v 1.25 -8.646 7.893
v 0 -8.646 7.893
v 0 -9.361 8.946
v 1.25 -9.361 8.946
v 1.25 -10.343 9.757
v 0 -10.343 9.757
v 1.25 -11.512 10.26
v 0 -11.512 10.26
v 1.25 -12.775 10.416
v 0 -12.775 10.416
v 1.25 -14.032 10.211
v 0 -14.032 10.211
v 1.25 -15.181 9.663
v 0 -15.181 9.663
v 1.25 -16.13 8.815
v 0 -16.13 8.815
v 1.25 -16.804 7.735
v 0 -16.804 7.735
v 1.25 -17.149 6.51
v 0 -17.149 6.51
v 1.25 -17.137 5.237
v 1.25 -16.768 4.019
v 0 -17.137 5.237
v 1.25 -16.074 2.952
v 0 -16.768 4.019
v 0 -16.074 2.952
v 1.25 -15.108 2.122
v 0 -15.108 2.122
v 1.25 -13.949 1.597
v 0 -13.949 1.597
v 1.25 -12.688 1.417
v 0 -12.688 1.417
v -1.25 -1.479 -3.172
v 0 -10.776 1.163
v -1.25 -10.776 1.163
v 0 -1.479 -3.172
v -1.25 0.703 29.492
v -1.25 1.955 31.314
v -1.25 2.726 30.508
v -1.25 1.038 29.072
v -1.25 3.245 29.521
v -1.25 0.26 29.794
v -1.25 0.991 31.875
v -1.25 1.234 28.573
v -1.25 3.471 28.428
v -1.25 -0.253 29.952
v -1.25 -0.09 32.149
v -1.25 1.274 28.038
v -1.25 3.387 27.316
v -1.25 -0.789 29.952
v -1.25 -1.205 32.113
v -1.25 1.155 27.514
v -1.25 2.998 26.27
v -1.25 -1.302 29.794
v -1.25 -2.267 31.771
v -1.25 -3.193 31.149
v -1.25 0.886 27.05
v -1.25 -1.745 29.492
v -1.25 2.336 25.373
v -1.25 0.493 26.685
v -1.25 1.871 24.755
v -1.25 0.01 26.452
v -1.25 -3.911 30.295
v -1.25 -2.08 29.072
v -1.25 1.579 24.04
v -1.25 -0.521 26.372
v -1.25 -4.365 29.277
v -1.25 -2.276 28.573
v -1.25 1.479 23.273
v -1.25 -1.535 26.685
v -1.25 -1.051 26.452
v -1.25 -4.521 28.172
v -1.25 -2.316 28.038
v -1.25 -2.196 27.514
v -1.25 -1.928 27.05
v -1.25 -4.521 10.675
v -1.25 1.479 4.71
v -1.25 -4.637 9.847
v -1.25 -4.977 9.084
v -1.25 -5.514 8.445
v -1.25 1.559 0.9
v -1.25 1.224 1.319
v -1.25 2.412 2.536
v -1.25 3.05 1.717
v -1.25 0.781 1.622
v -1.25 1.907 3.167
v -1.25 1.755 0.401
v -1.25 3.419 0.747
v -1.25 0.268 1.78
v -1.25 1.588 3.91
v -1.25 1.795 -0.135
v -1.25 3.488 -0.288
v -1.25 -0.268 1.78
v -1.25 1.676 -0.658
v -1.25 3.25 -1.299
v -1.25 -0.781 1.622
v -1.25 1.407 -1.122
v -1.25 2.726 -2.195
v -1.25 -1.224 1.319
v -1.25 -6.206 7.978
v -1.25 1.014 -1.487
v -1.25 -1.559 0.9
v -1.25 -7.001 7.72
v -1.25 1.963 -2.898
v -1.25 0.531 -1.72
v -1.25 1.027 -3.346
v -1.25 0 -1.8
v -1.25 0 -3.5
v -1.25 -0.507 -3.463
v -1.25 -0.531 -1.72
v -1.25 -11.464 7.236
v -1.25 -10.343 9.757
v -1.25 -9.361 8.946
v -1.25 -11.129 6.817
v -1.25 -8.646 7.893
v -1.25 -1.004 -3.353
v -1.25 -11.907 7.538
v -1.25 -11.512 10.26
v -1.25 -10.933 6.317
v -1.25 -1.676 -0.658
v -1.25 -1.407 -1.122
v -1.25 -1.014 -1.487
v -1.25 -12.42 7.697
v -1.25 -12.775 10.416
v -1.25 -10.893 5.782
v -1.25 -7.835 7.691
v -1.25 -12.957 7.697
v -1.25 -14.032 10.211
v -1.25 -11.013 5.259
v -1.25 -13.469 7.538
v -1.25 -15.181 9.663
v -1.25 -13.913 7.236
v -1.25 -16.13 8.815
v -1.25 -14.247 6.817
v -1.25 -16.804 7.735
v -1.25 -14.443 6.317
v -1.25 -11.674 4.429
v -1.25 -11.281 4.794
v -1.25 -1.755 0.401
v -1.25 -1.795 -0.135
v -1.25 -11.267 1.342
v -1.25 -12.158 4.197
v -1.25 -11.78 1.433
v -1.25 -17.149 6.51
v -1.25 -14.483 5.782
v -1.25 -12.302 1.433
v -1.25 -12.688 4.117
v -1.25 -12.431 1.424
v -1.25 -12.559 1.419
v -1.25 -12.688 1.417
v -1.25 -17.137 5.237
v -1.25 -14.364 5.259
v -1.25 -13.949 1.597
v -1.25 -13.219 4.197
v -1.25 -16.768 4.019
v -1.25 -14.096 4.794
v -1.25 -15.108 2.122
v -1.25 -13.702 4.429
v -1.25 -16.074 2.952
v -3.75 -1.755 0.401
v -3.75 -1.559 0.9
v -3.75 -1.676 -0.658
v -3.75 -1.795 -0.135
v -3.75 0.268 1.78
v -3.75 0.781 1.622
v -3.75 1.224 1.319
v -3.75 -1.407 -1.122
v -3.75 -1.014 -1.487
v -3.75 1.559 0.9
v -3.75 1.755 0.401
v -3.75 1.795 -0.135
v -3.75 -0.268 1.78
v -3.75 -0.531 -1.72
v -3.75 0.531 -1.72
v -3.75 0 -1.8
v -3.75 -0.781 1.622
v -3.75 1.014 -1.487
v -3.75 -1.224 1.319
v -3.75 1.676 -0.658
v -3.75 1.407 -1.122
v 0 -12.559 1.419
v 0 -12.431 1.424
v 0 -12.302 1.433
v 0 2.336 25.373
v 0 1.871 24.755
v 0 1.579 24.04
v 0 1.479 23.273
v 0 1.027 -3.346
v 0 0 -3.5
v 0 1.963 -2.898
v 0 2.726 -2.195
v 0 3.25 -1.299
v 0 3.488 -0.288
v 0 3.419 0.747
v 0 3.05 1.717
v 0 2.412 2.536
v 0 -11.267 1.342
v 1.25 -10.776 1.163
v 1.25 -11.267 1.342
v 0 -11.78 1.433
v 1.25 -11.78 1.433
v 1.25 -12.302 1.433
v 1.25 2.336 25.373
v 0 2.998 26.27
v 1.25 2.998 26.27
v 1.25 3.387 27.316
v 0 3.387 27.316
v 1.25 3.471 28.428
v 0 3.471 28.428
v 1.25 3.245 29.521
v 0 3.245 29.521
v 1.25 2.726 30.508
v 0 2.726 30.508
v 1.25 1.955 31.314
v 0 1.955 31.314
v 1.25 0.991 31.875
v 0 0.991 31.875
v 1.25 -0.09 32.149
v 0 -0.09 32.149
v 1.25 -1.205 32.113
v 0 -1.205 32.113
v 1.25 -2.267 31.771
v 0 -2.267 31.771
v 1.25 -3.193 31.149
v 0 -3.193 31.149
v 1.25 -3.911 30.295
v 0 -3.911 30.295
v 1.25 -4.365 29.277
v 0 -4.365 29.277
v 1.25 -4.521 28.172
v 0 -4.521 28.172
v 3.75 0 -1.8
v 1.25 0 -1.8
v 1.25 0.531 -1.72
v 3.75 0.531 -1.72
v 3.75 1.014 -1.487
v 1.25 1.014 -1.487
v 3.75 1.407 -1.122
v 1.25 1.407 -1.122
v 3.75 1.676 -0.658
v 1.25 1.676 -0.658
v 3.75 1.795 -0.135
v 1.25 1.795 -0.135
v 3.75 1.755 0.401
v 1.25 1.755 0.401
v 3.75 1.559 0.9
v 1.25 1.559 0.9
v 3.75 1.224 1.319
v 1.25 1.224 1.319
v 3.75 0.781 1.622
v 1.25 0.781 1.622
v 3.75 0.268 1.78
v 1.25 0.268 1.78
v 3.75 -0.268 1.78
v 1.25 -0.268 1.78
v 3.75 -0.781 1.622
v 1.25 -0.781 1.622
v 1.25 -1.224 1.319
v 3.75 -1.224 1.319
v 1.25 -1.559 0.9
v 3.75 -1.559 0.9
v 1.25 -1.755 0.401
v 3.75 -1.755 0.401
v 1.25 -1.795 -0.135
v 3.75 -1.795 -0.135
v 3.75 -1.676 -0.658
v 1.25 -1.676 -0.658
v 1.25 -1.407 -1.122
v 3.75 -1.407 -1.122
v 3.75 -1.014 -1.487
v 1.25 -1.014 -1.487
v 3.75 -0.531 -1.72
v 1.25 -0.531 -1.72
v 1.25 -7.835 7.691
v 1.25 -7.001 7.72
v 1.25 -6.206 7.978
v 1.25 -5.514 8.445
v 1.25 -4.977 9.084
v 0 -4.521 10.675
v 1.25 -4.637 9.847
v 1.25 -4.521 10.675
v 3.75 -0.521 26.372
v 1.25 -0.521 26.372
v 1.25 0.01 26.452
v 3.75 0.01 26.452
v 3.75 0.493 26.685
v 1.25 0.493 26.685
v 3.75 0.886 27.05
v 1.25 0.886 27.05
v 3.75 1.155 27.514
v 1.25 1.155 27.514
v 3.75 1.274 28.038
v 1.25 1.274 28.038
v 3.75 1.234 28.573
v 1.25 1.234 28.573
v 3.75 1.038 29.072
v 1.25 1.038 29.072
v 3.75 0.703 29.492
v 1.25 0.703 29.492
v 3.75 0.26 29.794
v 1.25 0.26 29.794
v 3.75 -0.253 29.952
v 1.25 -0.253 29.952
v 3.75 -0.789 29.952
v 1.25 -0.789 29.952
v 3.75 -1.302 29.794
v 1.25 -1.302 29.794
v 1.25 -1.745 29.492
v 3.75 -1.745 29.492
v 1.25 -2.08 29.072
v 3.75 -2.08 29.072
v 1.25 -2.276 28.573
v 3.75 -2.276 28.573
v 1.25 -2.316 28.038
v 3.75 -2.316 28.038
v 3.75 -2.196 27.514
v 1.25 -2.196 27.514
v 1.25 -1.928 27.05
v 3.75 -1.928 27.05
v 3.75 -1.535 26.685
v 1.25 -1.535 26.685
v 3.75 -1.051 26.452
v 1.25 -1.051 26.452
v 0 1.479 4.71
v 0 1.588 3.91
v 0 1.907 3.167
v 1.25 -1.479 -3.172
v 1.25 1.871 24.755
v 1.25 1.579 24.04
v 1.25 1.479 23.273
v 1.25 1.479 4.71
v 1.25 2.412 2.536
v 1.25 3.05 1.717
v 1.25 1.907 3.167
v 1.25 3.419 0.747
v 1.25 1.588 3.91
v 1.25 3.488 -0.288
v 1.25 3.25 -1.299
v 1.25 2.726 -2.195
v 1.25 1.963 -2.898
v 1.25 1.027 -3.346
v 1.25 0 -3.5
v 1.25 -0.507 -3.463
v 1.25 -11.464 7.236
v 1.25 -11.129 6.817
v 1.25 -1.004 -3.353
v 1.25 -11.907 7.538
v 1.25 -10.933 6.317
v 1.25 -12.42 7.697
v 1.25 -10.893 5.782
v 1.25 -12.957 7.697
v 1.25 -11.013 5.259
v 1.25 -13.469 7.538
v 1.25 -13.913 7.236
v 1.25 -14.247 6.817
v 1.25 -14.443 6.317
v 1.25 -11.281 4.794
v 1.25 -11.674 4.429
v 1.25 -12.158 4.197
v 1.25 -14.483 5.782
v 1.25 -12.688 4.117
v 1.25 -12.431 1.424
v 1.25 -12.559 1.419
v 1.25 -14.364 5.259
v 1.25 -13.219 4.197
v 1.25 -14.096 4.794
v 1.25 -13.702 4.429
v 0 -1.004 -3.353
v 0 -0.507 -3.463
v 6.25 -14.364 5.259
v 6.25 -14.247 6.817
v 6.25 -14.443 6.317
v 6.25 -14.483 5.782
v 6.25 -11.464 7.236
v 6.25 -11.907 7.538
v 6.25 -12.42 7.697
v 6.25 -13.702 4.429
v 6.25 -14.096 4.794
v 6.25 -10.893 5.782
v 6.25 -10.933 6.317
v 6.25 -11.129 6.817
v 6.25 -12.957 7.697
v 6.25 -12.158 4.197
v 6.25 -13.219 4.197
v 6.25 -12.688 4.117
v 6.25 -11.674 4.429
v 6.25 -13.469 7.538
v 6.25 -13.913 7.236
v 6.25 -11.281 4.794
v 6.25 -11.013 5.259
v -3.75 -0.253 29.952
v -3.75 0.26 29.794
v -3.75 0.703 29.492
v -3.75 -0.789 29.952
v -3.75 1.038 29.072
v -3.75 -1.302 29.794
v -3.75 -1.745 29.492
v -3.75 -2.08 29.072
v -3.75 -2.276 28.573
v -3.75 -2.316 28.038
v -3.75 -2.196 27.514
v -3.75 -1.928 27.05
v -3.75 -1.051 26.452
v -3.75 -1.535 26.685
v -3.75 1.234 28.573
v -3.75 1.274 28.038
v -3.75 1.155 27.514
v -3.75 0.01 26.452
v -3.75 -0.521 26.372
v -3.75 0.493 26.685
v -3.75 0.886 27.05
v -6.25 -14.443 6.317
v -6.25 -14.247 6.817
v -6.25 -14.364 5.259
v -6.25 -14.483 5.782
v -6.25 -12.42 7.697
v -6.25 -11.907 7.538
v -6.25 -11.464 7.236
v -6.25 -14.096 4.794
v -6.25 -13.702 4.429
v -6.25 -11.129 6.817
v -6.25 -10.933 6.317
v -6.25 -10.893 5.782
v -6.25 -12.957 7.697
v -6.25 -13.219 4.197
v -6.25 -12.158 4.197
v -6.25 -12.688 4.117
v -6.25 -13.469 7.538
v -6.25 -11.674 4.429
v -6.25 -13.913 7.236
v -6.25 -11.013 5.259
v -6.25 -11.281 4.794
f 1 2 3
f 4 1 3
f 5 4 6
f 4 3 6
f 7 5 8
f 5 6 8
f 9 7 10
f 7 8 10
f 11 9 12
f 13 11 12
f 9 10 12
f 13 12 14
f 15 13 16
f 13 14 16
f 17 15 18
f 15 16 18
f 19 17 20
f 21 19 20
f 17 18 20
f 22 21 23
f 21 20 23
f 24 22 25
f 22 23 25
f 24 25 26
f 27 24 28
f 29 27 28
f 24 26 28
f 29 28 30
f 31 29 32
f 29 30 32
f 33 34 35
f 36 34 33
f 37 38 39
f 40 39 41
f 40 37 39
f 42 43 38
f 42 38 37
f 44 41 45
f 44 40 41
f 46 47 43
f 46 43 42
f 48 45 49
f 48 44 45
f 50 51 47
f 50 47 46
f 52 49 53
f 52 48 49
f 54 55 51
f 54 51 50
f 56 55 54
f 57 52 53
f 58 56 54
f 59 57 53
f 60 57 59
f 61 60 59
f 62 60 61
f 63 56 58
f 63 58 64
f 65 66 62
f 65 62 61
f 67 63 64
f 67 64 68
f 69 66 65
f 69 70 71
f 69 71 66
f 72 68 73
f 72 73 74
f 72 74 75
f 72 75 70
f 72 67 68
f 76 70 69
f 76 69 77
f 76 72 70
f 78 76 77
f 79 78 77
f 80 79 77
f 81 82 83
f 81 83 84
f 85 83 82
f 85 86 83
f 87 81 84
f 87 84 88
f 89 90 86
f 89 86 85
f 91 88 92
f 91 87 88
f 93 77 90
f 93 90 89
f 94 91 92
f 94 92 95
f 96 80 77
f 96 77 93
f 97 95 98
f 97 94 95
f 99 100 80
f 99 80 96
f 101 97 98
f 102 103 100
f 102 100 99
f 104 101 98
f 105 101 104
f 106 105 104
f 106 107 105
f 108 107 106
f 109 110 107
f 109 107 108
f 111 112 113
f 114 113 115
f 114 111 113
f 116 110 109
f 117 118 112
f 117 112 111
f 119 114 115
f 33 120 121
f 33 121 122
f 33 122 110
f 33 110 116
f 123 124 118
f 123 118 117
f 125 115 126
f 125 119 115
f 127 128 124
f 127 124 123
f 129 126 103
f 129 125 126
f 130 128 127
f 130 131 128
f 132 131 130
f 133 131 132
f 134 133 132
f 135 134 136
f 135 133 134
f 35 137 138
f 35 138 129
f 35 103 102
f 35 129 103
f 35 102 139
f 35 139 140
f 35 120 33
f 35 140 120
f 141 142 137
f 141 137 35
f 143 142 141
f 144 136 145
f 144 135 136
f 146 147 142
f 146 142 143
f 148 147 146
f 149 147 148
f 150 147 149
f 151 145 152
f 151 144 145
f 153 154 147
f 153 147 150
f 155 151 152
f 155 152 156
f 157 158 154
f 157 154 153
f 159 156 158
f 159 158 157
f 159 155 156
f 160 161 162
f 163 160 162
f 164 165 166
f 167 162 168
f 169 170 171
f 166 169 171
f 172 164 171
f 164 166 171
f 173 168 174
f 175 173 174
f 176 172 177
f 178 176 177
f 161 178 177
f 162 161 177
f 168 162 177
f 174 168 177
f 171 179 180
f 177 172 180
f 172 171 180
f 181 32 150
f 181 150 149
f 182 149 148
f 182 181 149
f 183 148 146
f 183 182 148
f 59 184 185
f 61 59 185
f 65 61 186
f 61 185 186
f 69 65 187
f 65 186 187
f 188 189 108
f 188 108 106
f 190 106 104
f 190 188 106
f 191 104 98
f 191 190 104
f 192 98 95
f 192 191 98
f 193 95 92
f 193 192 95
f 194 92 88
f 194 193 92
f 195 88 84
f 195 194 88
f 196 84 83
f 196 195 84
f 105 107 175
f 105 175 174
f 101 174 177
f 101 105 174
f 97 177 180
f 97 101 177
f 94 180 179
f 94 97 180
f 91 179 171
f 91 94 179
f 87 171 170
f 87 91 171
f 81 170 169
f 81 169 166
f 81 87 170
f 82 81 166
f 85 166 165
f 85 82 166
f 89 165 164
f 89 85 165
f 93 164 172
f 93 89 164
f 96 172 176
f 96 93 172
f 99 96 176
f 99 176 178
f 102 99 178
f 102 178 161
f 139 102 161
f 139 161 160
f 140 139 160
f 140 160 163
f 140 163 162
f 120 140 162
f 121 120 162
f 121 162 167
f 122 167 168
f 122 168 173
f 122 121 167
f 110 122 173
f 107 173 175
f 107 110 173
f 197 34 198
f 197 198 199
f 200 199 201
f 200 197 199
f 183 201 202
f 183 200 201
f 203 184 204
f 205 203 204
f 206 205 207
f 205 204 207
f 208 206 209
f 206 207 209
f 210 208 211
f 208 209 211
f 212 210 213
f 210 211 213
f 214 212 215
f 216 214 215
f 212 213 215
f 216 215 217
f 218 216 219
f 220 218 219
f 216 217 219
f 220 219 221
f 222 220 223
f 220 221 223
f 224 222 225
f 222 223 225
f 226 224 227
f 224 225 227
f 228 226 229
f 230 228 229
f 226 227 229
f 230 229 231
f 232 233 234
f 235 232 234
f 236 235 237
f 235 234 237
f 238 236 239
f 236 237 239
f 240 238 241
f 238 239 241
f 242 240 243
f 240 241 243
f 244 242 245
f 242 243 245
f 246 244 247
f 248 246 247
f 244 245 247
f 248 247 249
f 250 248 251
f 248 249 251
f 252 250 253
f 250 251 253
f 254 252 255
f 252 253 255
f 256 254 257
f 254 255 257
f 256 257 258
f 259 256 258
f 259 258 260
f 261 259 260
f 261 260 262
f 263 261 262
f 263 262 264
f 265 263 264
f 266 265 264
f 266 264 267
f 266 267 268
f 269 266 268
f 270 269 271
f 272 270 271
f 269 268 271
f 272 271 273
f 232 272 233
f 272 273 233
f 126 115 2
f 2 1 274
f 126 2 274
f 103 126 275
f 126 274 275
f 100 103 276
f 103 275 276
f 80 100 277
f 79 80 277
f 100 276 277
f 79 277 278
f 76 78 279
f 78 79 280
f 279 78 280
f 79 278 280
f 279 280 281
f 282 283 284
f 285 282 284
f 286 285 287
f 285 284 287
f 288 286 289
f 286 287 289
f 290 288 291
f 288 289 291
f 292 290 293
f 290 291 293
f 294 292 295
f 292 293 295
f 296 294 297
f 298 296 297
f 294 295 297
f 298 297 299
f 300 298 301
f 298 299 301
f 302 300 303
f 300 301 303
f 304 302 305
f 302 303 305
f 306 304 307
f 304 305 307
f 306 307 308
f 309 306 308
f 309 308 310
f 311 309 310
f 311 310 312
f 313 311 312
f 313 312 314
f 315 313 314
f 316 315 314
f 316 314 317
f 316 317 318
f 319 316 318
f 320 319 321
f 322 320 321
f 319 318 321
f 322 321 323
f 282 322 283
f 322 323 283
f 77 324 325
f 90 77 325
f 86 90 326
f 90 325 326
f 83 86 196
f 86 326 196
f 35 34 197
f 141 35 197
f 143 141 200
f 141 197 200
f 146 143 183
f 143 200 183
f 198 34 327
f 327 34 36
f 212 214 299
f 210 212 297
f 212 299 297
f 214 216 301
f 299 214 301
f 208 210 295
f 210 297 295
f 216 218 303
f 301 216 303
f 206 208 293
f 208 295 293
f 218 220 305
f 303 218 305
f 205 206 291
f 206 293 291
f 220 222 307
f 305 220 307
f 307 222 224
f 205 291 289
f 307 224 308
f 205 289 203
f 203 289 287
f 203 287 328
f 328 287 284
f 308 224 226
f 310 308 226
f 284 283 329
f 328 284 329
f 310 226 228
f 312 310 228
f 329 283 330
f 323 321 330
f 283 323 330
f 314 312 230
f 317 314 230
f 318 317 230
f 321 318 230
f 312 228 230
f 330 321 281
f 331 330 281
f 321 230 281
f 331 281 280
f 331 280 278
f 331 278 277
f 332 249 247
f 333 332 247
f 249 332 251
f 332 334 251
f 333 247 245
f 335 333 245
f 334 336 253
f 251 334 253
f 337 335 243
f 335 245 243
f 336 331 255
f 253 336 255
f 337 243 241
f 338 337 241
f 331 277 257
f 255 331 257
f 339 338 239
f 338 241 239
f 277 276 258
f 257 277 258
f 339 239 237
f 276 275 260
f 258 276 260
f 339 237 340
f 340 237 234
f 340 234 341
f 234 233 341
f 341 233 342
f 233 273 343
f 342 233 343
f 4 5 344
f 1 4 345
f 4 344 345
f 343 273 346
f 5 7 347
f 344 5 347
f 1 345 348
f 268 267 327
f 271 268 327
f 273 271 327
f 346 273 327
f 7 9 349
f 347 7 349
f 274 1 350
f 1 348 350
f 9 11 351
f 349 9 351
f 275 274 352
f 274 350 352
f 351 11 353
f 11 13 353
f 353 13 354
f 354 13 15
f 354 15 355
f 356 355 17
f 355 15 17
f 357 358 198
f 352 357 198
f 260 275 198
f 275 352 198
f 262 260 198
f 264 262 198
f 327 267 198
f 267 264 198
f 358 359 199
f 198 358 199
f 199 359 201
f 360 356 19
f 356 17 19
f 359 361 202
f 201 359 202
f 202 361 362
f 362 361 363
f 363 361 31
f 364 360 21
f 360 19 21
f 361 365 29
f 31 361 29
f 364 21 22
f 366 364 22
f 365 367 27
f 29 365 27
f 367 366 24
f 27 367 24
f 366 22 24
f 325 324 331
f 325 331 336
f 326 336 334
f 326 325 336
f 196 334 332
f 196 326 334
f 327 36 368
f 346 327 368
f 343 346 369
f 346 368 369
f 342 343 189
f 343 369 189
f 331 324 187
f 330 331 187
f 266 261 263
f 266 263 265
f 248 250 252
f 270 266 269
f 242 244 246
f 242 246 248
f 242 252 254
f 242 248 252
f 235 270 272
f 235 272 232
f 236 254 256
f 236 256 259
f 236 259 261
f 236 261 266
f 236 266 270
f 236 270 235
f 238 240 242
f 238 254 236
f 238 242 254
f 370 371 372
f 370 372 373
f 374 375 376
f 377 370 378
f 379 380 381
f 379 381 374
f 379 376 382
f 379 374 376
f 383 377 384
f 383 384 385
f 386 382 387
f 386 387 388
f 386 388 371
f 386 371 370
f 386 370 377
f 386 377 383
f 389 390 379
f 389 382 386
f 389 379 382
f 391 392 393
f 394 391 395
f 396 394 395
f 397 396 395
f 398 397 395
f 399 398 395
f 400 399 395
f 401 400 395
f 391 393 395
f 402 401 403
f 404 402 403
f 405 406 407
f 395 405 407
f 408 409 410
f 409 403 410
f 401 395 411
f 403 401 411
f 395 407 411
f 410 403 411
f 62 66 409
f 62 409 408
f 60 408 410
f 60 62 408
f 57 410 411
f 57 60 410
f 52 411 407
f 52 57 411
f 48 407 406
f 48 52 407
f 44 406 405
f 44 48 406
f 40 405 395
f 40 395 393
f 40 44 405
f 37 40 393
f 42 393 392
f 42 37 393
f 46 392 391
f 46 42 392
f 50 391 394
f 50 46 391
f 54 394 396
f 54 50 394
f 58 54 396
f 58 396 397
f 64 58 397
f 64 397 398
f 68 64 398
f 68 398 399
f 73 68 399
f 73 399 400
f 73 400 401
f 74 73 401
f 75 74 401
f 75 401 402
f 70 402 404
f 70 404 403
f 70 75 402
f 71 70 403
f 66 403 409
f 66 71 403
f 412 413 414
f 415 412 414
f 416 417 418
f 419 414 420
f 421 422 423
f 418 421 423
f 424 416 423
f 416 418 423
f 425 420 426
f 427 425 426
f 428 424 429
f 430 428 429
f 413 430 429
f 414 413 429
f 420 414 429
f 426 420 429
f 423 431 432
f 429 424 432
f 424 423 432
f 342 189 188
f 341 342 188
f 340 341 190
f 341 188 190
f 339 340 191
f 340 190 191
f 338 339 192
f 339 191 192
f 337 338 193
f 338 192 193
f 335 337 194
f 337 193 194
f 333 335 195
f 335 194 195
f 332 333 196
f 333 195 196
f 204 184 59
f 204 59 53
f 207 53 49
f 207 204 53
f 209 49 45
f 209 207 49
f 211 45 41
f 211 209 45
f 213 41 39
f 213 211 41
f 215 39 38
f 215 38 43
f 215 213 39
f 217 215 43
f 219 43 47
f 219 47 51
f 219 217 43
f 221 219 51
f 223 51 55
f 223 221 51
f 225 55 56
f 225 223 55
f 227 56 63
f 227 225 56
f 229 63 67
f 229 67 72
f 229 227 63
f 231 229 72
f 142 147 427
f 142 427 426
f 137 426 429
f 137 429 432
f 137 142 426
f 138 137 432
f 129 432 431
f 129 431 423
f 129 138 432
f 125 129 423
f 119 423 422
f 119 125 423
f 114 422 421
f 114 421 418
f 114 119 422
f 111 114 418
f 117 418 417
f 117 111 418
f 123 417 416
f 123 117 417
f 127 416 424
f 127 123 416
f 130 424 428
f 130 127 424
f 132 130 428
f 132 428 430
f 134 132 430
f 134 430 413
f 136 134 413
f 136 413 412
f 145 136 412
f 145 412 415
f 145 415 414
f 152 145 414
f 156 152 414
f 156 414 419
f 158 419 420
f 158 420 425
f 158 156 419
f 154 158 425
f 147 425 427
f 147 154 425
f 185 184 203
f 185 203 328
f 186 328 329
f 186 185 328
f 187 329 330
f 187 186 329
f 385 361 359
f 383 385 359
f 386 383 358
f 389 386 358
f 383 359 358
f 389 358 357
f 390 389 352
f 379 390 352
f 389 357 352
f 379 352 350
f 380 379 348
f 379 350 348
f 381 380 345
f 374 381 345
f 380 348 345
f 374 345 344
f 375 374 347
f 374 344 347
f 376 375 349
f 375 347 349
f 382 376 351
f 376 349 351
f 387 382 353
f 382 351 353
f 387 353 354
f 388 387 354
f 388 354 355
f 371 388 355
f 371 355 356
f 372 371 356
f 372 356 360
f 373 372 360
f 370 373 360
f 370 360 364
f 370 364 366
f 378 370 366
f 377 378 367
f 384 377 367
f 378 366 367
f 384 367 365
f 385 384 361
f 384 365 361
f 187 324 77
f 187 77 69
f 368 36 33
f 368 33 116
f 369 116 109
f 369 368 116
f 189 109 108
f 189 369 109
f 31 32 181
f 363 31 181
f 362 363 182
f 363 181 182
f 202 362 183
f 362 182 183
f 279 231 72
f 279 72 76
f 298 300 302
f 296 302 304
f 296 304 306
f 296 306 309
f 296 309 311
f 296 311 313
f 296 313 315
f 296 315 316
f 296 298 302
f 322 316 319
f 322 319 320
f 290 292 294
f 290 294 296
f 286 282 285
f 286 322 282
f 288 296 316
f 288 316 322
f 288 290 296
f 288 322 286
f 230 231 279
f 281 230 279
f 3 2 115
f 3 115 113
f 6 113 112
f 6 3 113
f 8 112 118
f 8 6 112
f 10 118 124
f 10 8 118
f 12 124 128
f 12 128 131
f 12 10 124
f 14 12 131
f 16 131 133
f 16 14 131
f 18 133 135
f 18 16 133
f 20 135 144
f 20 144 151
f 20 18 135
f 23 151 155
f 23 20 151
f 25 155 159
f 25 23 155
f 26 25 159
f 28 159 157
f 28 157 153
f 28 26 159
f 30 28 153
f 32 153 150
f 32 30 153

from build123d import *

# Parameters (mm, degrees)
EXTRUDE_1_DEPTH     = 1.25
SKETCH_1_3_R        = 2
CUT_EXTRUDE_1_DEPTH = 37.497164572
FILLET_1_R          = 3
EXTRUDE_START       = -1.25
SKETCH_2_R          = 2
EXTRUDE_2_DEPTH     = 1.25
SKETCH_2_5_R        = 1.8
EXTRUDE_5_DEPTH     = 2.5
SKETCH_2_7_R        = 1.8
EXTRUDE_7_DEPTH     = 5


with BuildPart() as part:
    # 草图1 → 凸台-拉伸1 (new body)
    with BuildSketch(Plane(origin=(0, 0, 0), x_dir=(0, 0, -1), z_dir=(1, 0, 0))):
        with BuildLine():
            Line((-28.172077255, -4.520836084), (-28.172077255, 1.479163916))
            Line((-28.172077255, 1.479163916), (-24.707975639, 1.479163916))
            ThreePointArc((-24.707975639, 1.479163916), (-31.63617887, 1.479163916), (-28.172077255, -4.520836084))
        make_face()
        with BuildLine():
            Line((-24.707975639, 1.479163916), (-28.172077255, 1.479163916))
            Line((-28.172077255, 1.479163916), (-28.172077255, -4.520836084))
            ThreePointArc((-28.172077255, -4.520836084), (-25.34365013, -3.349263209), (-24.172077255, -0.520836084))
            ThreePointArc((-24.172077255, -0.520836084), (-24.308373949, 0.514440097), (-24.707975639, 1.479163916))
        make_face()
        with BuildLine():
            Line((-3.172077255, 1.479163916), (-24.707975639, 1.479163916))
            ThreePointArc((-24.707975639, 1.479163916), (-24.308373949, 0.514440097), (-24.172077255, -0.520836084))
            ThreePointArc((-24.172077255, -0.520836084), (-25.34365013, -3.349263209), (-28.172077255, -4.520836084))
            Line((-28.172077255, -4.520836084), (-5.969923204, -4.520836084))
            Line((-5.969923204, -4.520836084), (-3.172077255, 1.479163916))
        make_face()
        with BuildLine():
            Line((3.172077255, -1.479163916), (-3.172077255, 1.479163916))
            Line((-3.172077255, 1.479163916), (-3.172077255, -1.479163916))
            ThreePointArc((-3.172077255, -1.479163916), (0, -3.5), (3.172077255, -1.479163916))
        make_face()
        with BuildLine():
            ThreePointArc((3.5, 0), (0.757538649, 3.417036025), (-3.172077255, 1.479163916))
            Line((-3.172077255, 1.479163916), (3.172077255, -1.479163916))
            ThreePointArc((3.172077255, -1.479163916), (3.417036025, -0.757538649), (3.5, 0))
        make_face()
        with BuildLine():
            ThreePointArc((-3.172077255, -1.479163916), (-3.5, 0), (-3.172077255, 1.479163916))
            Line((-3.172077255, 1.479163916), (-5.969923204, -4.520836084))
            Line((-5.969923204, -4.520836084), (-3.172077255, -4.520836084))
            Line((-3.172077255, -4.520836084), (-3.172077255, -1.479163916))
        make_face()
        with BuildLine():
            Line((-3.172077255, -1.479163916), (-3.172077255, 1.479163916))
            ThreePointArc((-3.172077255, 1.479163916), (-3.5, 0), (-3.172077255, -1.479163916))
        make_face()
        with BuildLine():
            Line((-3.172077255, -4.520836084), (-5.969923204, -4.520836084))
            Line((-5.969923204, -4.520836084), (-7.893387964, -8.645719574))
            ThreePointArc((-7.893387964, -8.645719574), (-4.014873487, -8.609923977), (-1.549233455, -11.604047406))
            Line((-1.549233455, -11.604047406), (3.172077255, -1.479163916))
            ThreePointArc((3.172077255, -1.479163916), (0, -3.5), (-3.172077255, -1.479163916))
            Line((-3.172077255, -1.479163916), (-3.172077255, -4.520836084))
        make_face()
        with BuildLine():
            ThreePointArc((-1.549233455, -11.604047406), (-4.014873487, -8.609923977), (-7.893387964, -8.645719574))
            Line((-7.893387964, -8.645719574), (-9.088732919, -11.209145102))
            Line((-9.088732919, -11.209145102), (-2.74457841, -14.167472935))
            Line((-2.74457841, -14.167472935), (-1.549233455, -11.604047406))
        make_face()
        with BuildLine():
            Line((-9.088732919, -11.209145102), (-7.893387964, -8.645719574))
            ThreePointArc((-7.893387964, -8.645719574), (-8.299375187, -16.50572276), (-1.416655664, -12.688309019))
            ThreePointArc((-1.416655664, -12.688309019), (-1.449923081, -12.14214052), (-1.549233455, -11.604047406))
            Line((-1.549233455, -11.604047406), (-2.74457841, -14.167472935))
            Line((-2.74457841, -14.167472935), (-9.088732919, -11.209145102))
        make_face()
    extrude(amount=EXTRUDE_1_DEPTH)

    # 草图1<3> → 切除-拉伸1 (cut, through all)
    with BuildSketch(Plane(origin=(0, 0, 0), x_dir=(0, 0, -1), z_dir=(1, 0, 0))):
        with Locations((-28.172077255, -0.520836084)):
            Circle(SKETCH_1_3_R)
        Circle(SKETCH_1_3_R)
        with Locations((-5.916655664, -12.688309019)):
            Circle(SKETCH_1_3_R)
    extrude(amount=CUT_EXTRUDE_1_DEPTH, mode=Mode.SUBTRACT)

    # 圆角1
    # the kernel refuses this fillet: 3 mm, written as the material it adds along each edge
    with BuildSketch(Plane(origin=(0, -11.604047406, 1.549233455), x_dir=(0, 0.9063077870366663, -0.4226182617406644), z_dir=(1, 0, 0))) as fillet_1_piece_1:
        with BuildLine():
            CenterArc((0.913230262, -3), FILLET_1_R, 90, 29.926434867)
            Line((-0.583432693, -0.4), (-0.613365952, -0.348))
            ThreePointArc((-0.613365952, -0.348), (-0.317772106, -0.161995545), (-0.037712362, 0.046666667))
            Line((-0.037712362, 0.046666667), (0, 0.06))
            Line((0, 0.06), (0.913230262, 0.06))
            Line((0.913230262, 0.06), (0.913230262, 0))
        make_face()
    extrude(amount=1.25)
    with BuildSketch(Plane(origin=(0, 1.479163916, 3.172077255), x_dir=(0, 0, 1), z_dir=(1, 0, 0))) as fillet_1_piece_2:
        with BuildLine():
            CenterArc((1.538240209, -3), FILLET_1_R, 90, 46.440922497)
            Line((-0.635752466, -0.932693577), (-0.67923232, -0.891347449))
            ThreePointArc((-0.67923232, -0.891347449), (-0.329607023, -0.458350724), (-0.054378467, 0.025357096))
            Line((-0.054378467, 0.025357096), (0, 0.06))
            Line((0, 0.06), (1.538240209, 0.06))
            Line((1.538240209, 0.06), (1.538240209, 0))
        make_face()
    extrude(amount=1.25)
    with BuildSketch(Plane(origin=(0, 1.479163916, 24.707975639), x_dir=(0, 0.7902368852402469, 0.6128014892326821), z_dir=(1, 0, 0))) as fillet_1_piece_3:
        with BuildLine():
            CenterArc((1.49141536, -2.972297887), FILLET_1_R, 97.792345701, 44.415308597)
            Line((-0.879295296, -1.133893419), (-0.926709509, -1.09712533))
            Line((-0.926709509, -1.09712533), (-0.047414213, 0.036768089))
            Line((-0.047414213, 0.036768089), (0.008134993, 0.059445958))
            ThreePointArc((0.008134993, 0.059445958), (0.542332858, 0.023063849), (1.076530723, 0.059445958))
            Line((1.076530723, 0.059445958), (1.084665716, 0))
        make_face()
    extrude(amount=1.25)
    with BuildSketch(Plane(origin=(0, -4.520836084, 5.969923204), x_dir=(0, 0, 1), z_dir=(1, 0, 0))) as fillet_1_piece_4:
        with BuildLine():
            CenterArc((4.704586321, 3), FILLET_1_R, 157.978087479, 112.021912521)
            Line((1.923464761, 4.12488349), (1.867842329, 4.14738116))
            ThreePointArc((1.867842329, 4.14738116), (0.907353913, 2.087798841), (-0.054378467, 0.025357096))
            Line((-0.054378467, 0.025357096), (0, -0.06))
            Line((0, -0.06), (4.704586321, -0.06))
            Line((4.704586321, -0.06), (4.704586321, 0))
        make_face()
    extrude(amount=1.25)

    # 草图2 → 凸台-拉伸2 (add)
    with BuildSketch(Plane(origin=(1.25, 0, 0), x_dir=(0, 0, -1), z_dir=(1, 0, 0)).offset(EXTRUDE_START)):
        Circle(SKETCH_2_R)
        with Locations((-5.916655664, -12.688309019)):
            Circle(SKETCH_2_R)
        with Locations((-28.172077255, -0.520836084)):
            Circle(SKETCH_2_R)
    extrude(amount=EXTRUDE_2_DEPTH)

    # 草图2<5> → 凸台-拉伸5 (add)
    with BuildSketch(Plane(origin=(1.25, 0, 0), x_dir=(0, 0, -1), z_dir=(1, 0, 0))):
        with Locations((-28.172077255, -0.520836084)):
            Circle(SKETCH_2_5_R)
        Circle(SKETCH_2_5_R)
    extrude(amount=EXTRUDE_5_DEPTH)

    # 草图2<7> → 凸台-拉伸7 (add)
    with BuildSketch(Plane(origin=(1.25, 0, 0), x_dir=(0, 0, -1), z_dir=(1, 0, 0))):
        with Locations((-5.916655664, -12.688309019)):
            Circle(SKETCH_2_7_R)
    extrude(amount=EXTRUDE_7_DEPTH)

    # 镜向1: part across plane


with BuildPart() as part_1:
    add(part.part)
    add(part.part.mirror(Plane.ZY))


solid = part_1.part
